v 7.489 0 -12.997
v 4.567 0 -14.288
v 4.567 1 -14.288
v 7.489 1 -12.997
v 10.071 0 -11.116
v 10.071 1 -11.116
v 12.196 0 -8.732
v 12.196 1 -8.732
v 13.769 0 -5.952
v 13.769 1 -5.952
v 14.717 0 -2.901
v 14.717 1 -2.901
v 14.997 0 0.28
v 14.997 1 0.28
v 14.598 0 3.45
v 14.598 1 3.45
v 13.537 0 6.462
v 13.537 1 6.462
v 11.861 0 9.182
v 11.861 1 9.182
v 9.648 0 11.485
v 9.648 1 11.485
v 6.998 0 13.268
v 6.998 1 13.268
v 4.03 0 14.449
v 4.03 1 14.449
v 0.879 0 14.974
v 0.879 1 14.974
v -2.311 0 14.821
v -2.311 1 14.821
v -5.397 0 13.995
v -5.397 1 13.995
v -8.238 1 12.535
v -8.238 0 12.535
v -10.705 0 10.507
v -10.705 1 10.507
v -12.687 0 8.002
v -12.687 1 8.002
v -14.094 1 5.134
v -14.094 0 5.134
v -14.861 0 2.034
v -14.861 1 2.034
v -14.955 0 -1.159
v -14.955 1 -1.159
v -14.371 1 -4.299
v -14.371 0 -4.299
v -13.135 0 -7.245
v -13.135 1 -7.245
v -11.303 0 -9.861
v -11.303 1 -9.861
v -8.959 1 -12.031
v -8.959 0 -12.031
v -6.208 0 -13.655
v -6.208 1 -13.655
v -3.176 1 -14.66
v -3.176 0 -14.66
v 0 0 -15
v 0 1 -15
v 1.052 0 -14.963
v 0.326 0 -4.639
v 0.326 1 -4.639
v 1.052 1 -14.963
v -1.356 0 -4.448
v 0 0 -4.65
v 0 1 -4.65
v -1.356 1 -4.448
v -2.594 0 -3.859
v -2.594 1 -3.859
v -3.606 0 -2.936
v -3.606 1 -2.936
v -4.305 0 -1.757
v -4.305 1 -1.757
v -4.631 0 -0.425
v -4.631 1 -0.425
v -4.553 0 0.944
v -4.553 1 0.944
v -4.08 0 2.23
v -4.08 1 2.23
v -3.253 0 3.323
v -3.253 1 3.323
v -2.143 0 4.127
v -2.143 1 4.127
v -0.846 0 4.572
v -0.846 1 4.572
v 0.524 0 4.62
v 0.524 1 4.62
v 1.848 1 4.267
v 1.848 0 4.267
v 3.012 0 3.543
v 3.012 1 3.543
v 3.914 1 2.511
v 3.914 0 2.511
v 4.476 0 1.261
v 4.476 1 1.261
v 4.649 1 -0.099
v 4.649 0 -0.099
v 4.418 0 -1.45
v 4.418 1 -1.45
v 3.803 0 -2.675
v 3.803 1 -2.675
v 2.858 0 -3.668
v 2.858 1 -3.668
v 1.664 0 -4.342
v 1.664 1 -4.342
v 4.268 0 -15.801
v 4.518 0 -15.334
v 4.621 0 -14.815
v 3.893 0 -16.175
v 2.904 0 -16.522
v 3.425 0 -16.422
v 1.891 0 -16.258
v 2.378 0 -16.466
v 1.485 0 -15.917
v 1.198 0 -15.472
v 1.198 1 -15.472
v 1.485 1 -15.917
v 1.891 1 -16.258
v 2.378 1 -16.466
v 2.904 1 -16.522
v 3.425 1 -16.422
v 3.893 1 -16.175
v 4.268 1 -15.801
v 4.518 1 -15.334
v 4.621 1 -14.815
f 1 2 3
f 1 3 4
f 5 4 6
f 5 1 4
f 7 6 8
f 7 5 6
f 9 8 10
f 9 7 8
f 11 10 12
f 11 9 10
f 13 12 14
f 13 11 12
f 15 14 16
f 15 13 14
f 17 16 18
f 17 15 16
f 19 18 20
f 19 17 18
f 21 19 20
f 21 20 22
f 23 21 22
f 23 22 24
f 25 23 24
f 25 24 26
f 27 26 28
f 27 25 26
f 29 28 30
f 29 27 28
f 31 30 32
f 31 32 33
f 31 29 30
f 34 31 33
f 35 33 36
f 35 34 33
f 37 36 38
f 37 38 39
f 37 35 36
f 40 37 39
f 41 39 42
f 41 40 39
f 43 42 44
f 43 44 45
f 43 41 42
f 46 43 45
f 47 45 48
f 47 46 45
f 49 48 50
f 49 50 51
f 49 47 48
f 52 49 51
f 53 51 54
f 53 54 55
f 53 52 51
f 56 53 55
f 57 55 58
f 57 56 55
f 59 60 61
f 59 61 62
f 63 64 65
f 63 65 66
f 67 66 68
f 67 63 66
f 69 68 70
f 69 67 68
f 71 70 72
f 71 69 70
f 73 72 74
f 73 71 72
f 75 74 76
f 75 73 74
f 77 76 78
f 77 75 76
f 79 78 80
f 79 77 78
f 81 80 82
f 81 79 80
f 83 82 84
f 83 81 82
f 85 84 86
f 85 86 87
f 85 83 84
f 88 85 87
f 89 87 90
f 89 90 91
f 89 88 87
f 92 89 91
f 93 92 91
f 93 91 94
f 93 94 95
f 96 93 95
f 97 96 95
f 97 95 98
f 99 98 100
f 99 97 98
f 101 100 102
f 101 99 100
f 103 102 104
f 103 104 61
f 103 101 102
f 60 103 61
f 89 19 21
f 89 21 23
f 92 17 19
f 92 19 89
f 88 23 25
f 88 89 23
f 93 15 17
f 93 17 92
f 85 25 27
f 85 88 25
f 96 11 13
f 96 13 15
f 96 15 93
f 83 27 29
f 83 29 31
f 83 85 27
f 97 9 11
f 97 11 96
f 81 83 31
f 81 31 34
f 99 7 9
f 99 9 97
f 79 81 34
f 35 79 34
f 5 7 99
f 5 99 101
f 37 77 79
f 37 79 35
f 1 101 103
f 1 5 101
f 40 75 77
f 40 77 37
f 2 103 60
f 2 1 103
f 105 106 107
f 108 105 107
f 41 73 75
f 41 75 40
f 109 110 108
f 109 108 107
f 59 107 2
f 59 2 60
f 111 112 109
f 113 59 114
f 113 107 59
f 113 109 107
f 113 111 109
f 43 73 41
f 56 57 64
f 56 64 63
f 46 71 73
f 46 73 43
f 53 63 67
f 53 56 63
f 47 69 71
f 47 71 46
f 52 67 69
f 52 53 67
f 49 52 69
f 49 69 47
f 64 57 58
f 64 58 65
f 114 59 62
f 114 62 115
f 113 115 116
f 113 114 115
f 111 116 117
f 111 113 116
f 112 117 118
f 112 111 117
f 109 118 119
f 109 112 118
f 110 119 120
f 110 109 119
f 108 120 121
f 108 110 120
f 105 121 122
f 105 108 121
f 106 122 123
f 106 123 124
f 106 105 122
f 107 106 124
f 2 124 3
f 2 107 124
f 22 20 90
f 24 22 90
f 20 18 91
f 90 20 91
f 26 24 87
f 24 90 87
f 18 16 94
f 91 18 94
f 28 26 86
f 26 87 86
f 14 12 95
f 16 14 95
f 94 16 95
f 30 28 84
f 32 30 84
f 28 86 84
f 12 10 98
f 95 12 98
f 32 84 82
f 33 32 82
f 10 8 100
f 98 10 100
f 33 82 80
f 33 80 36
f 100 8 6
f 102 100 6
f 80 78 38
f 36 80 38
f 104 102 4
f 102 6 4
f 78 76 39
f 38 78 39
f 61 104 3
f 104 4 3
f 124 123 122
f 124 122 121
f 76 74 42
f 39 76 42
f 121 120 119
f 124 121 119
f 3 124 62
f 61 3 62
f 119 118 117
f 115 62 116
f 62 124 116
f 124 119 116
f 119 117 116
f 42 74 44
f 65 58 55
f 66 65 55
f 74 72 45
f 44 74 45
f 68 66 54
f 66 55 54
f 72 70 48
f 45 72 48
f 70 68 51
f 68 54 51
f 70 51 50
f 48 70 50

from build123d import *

# Parameters (mm, degrees)
BOSS_EXTRUDE2_DEPTH = 1


with BuildPart() as part:
    # Sketch1 → Boss-Extrude2 (new body)
    with BuildSketch(Plane(origin=(0, 0, 0), x_dir=(1, 0, 0), z_dir=(0, 1, 0))):
        with BuildLine():
            Line((0, 15), (0, 4.65))
            ThreePointArc((0, 4.65), (-0.163175848, -4.647136069), (0.326150697, 4.638547803))
            Line((0.326150697, 4.638547803), (1.052099022, 14.96305743))
            ThreePointArc((1.052099022, 14.96305743), (3.168172024, 16.491380461), (4.567296532, 14.287750081))
            ThreePointArc((4.567296532, 14.287750081), (-2.31124953, -14.82086791), (0, 15))
        make_face()
    extrude(amount=BOSS_EXTRUDE2_DEPTH)


solid = part.part
